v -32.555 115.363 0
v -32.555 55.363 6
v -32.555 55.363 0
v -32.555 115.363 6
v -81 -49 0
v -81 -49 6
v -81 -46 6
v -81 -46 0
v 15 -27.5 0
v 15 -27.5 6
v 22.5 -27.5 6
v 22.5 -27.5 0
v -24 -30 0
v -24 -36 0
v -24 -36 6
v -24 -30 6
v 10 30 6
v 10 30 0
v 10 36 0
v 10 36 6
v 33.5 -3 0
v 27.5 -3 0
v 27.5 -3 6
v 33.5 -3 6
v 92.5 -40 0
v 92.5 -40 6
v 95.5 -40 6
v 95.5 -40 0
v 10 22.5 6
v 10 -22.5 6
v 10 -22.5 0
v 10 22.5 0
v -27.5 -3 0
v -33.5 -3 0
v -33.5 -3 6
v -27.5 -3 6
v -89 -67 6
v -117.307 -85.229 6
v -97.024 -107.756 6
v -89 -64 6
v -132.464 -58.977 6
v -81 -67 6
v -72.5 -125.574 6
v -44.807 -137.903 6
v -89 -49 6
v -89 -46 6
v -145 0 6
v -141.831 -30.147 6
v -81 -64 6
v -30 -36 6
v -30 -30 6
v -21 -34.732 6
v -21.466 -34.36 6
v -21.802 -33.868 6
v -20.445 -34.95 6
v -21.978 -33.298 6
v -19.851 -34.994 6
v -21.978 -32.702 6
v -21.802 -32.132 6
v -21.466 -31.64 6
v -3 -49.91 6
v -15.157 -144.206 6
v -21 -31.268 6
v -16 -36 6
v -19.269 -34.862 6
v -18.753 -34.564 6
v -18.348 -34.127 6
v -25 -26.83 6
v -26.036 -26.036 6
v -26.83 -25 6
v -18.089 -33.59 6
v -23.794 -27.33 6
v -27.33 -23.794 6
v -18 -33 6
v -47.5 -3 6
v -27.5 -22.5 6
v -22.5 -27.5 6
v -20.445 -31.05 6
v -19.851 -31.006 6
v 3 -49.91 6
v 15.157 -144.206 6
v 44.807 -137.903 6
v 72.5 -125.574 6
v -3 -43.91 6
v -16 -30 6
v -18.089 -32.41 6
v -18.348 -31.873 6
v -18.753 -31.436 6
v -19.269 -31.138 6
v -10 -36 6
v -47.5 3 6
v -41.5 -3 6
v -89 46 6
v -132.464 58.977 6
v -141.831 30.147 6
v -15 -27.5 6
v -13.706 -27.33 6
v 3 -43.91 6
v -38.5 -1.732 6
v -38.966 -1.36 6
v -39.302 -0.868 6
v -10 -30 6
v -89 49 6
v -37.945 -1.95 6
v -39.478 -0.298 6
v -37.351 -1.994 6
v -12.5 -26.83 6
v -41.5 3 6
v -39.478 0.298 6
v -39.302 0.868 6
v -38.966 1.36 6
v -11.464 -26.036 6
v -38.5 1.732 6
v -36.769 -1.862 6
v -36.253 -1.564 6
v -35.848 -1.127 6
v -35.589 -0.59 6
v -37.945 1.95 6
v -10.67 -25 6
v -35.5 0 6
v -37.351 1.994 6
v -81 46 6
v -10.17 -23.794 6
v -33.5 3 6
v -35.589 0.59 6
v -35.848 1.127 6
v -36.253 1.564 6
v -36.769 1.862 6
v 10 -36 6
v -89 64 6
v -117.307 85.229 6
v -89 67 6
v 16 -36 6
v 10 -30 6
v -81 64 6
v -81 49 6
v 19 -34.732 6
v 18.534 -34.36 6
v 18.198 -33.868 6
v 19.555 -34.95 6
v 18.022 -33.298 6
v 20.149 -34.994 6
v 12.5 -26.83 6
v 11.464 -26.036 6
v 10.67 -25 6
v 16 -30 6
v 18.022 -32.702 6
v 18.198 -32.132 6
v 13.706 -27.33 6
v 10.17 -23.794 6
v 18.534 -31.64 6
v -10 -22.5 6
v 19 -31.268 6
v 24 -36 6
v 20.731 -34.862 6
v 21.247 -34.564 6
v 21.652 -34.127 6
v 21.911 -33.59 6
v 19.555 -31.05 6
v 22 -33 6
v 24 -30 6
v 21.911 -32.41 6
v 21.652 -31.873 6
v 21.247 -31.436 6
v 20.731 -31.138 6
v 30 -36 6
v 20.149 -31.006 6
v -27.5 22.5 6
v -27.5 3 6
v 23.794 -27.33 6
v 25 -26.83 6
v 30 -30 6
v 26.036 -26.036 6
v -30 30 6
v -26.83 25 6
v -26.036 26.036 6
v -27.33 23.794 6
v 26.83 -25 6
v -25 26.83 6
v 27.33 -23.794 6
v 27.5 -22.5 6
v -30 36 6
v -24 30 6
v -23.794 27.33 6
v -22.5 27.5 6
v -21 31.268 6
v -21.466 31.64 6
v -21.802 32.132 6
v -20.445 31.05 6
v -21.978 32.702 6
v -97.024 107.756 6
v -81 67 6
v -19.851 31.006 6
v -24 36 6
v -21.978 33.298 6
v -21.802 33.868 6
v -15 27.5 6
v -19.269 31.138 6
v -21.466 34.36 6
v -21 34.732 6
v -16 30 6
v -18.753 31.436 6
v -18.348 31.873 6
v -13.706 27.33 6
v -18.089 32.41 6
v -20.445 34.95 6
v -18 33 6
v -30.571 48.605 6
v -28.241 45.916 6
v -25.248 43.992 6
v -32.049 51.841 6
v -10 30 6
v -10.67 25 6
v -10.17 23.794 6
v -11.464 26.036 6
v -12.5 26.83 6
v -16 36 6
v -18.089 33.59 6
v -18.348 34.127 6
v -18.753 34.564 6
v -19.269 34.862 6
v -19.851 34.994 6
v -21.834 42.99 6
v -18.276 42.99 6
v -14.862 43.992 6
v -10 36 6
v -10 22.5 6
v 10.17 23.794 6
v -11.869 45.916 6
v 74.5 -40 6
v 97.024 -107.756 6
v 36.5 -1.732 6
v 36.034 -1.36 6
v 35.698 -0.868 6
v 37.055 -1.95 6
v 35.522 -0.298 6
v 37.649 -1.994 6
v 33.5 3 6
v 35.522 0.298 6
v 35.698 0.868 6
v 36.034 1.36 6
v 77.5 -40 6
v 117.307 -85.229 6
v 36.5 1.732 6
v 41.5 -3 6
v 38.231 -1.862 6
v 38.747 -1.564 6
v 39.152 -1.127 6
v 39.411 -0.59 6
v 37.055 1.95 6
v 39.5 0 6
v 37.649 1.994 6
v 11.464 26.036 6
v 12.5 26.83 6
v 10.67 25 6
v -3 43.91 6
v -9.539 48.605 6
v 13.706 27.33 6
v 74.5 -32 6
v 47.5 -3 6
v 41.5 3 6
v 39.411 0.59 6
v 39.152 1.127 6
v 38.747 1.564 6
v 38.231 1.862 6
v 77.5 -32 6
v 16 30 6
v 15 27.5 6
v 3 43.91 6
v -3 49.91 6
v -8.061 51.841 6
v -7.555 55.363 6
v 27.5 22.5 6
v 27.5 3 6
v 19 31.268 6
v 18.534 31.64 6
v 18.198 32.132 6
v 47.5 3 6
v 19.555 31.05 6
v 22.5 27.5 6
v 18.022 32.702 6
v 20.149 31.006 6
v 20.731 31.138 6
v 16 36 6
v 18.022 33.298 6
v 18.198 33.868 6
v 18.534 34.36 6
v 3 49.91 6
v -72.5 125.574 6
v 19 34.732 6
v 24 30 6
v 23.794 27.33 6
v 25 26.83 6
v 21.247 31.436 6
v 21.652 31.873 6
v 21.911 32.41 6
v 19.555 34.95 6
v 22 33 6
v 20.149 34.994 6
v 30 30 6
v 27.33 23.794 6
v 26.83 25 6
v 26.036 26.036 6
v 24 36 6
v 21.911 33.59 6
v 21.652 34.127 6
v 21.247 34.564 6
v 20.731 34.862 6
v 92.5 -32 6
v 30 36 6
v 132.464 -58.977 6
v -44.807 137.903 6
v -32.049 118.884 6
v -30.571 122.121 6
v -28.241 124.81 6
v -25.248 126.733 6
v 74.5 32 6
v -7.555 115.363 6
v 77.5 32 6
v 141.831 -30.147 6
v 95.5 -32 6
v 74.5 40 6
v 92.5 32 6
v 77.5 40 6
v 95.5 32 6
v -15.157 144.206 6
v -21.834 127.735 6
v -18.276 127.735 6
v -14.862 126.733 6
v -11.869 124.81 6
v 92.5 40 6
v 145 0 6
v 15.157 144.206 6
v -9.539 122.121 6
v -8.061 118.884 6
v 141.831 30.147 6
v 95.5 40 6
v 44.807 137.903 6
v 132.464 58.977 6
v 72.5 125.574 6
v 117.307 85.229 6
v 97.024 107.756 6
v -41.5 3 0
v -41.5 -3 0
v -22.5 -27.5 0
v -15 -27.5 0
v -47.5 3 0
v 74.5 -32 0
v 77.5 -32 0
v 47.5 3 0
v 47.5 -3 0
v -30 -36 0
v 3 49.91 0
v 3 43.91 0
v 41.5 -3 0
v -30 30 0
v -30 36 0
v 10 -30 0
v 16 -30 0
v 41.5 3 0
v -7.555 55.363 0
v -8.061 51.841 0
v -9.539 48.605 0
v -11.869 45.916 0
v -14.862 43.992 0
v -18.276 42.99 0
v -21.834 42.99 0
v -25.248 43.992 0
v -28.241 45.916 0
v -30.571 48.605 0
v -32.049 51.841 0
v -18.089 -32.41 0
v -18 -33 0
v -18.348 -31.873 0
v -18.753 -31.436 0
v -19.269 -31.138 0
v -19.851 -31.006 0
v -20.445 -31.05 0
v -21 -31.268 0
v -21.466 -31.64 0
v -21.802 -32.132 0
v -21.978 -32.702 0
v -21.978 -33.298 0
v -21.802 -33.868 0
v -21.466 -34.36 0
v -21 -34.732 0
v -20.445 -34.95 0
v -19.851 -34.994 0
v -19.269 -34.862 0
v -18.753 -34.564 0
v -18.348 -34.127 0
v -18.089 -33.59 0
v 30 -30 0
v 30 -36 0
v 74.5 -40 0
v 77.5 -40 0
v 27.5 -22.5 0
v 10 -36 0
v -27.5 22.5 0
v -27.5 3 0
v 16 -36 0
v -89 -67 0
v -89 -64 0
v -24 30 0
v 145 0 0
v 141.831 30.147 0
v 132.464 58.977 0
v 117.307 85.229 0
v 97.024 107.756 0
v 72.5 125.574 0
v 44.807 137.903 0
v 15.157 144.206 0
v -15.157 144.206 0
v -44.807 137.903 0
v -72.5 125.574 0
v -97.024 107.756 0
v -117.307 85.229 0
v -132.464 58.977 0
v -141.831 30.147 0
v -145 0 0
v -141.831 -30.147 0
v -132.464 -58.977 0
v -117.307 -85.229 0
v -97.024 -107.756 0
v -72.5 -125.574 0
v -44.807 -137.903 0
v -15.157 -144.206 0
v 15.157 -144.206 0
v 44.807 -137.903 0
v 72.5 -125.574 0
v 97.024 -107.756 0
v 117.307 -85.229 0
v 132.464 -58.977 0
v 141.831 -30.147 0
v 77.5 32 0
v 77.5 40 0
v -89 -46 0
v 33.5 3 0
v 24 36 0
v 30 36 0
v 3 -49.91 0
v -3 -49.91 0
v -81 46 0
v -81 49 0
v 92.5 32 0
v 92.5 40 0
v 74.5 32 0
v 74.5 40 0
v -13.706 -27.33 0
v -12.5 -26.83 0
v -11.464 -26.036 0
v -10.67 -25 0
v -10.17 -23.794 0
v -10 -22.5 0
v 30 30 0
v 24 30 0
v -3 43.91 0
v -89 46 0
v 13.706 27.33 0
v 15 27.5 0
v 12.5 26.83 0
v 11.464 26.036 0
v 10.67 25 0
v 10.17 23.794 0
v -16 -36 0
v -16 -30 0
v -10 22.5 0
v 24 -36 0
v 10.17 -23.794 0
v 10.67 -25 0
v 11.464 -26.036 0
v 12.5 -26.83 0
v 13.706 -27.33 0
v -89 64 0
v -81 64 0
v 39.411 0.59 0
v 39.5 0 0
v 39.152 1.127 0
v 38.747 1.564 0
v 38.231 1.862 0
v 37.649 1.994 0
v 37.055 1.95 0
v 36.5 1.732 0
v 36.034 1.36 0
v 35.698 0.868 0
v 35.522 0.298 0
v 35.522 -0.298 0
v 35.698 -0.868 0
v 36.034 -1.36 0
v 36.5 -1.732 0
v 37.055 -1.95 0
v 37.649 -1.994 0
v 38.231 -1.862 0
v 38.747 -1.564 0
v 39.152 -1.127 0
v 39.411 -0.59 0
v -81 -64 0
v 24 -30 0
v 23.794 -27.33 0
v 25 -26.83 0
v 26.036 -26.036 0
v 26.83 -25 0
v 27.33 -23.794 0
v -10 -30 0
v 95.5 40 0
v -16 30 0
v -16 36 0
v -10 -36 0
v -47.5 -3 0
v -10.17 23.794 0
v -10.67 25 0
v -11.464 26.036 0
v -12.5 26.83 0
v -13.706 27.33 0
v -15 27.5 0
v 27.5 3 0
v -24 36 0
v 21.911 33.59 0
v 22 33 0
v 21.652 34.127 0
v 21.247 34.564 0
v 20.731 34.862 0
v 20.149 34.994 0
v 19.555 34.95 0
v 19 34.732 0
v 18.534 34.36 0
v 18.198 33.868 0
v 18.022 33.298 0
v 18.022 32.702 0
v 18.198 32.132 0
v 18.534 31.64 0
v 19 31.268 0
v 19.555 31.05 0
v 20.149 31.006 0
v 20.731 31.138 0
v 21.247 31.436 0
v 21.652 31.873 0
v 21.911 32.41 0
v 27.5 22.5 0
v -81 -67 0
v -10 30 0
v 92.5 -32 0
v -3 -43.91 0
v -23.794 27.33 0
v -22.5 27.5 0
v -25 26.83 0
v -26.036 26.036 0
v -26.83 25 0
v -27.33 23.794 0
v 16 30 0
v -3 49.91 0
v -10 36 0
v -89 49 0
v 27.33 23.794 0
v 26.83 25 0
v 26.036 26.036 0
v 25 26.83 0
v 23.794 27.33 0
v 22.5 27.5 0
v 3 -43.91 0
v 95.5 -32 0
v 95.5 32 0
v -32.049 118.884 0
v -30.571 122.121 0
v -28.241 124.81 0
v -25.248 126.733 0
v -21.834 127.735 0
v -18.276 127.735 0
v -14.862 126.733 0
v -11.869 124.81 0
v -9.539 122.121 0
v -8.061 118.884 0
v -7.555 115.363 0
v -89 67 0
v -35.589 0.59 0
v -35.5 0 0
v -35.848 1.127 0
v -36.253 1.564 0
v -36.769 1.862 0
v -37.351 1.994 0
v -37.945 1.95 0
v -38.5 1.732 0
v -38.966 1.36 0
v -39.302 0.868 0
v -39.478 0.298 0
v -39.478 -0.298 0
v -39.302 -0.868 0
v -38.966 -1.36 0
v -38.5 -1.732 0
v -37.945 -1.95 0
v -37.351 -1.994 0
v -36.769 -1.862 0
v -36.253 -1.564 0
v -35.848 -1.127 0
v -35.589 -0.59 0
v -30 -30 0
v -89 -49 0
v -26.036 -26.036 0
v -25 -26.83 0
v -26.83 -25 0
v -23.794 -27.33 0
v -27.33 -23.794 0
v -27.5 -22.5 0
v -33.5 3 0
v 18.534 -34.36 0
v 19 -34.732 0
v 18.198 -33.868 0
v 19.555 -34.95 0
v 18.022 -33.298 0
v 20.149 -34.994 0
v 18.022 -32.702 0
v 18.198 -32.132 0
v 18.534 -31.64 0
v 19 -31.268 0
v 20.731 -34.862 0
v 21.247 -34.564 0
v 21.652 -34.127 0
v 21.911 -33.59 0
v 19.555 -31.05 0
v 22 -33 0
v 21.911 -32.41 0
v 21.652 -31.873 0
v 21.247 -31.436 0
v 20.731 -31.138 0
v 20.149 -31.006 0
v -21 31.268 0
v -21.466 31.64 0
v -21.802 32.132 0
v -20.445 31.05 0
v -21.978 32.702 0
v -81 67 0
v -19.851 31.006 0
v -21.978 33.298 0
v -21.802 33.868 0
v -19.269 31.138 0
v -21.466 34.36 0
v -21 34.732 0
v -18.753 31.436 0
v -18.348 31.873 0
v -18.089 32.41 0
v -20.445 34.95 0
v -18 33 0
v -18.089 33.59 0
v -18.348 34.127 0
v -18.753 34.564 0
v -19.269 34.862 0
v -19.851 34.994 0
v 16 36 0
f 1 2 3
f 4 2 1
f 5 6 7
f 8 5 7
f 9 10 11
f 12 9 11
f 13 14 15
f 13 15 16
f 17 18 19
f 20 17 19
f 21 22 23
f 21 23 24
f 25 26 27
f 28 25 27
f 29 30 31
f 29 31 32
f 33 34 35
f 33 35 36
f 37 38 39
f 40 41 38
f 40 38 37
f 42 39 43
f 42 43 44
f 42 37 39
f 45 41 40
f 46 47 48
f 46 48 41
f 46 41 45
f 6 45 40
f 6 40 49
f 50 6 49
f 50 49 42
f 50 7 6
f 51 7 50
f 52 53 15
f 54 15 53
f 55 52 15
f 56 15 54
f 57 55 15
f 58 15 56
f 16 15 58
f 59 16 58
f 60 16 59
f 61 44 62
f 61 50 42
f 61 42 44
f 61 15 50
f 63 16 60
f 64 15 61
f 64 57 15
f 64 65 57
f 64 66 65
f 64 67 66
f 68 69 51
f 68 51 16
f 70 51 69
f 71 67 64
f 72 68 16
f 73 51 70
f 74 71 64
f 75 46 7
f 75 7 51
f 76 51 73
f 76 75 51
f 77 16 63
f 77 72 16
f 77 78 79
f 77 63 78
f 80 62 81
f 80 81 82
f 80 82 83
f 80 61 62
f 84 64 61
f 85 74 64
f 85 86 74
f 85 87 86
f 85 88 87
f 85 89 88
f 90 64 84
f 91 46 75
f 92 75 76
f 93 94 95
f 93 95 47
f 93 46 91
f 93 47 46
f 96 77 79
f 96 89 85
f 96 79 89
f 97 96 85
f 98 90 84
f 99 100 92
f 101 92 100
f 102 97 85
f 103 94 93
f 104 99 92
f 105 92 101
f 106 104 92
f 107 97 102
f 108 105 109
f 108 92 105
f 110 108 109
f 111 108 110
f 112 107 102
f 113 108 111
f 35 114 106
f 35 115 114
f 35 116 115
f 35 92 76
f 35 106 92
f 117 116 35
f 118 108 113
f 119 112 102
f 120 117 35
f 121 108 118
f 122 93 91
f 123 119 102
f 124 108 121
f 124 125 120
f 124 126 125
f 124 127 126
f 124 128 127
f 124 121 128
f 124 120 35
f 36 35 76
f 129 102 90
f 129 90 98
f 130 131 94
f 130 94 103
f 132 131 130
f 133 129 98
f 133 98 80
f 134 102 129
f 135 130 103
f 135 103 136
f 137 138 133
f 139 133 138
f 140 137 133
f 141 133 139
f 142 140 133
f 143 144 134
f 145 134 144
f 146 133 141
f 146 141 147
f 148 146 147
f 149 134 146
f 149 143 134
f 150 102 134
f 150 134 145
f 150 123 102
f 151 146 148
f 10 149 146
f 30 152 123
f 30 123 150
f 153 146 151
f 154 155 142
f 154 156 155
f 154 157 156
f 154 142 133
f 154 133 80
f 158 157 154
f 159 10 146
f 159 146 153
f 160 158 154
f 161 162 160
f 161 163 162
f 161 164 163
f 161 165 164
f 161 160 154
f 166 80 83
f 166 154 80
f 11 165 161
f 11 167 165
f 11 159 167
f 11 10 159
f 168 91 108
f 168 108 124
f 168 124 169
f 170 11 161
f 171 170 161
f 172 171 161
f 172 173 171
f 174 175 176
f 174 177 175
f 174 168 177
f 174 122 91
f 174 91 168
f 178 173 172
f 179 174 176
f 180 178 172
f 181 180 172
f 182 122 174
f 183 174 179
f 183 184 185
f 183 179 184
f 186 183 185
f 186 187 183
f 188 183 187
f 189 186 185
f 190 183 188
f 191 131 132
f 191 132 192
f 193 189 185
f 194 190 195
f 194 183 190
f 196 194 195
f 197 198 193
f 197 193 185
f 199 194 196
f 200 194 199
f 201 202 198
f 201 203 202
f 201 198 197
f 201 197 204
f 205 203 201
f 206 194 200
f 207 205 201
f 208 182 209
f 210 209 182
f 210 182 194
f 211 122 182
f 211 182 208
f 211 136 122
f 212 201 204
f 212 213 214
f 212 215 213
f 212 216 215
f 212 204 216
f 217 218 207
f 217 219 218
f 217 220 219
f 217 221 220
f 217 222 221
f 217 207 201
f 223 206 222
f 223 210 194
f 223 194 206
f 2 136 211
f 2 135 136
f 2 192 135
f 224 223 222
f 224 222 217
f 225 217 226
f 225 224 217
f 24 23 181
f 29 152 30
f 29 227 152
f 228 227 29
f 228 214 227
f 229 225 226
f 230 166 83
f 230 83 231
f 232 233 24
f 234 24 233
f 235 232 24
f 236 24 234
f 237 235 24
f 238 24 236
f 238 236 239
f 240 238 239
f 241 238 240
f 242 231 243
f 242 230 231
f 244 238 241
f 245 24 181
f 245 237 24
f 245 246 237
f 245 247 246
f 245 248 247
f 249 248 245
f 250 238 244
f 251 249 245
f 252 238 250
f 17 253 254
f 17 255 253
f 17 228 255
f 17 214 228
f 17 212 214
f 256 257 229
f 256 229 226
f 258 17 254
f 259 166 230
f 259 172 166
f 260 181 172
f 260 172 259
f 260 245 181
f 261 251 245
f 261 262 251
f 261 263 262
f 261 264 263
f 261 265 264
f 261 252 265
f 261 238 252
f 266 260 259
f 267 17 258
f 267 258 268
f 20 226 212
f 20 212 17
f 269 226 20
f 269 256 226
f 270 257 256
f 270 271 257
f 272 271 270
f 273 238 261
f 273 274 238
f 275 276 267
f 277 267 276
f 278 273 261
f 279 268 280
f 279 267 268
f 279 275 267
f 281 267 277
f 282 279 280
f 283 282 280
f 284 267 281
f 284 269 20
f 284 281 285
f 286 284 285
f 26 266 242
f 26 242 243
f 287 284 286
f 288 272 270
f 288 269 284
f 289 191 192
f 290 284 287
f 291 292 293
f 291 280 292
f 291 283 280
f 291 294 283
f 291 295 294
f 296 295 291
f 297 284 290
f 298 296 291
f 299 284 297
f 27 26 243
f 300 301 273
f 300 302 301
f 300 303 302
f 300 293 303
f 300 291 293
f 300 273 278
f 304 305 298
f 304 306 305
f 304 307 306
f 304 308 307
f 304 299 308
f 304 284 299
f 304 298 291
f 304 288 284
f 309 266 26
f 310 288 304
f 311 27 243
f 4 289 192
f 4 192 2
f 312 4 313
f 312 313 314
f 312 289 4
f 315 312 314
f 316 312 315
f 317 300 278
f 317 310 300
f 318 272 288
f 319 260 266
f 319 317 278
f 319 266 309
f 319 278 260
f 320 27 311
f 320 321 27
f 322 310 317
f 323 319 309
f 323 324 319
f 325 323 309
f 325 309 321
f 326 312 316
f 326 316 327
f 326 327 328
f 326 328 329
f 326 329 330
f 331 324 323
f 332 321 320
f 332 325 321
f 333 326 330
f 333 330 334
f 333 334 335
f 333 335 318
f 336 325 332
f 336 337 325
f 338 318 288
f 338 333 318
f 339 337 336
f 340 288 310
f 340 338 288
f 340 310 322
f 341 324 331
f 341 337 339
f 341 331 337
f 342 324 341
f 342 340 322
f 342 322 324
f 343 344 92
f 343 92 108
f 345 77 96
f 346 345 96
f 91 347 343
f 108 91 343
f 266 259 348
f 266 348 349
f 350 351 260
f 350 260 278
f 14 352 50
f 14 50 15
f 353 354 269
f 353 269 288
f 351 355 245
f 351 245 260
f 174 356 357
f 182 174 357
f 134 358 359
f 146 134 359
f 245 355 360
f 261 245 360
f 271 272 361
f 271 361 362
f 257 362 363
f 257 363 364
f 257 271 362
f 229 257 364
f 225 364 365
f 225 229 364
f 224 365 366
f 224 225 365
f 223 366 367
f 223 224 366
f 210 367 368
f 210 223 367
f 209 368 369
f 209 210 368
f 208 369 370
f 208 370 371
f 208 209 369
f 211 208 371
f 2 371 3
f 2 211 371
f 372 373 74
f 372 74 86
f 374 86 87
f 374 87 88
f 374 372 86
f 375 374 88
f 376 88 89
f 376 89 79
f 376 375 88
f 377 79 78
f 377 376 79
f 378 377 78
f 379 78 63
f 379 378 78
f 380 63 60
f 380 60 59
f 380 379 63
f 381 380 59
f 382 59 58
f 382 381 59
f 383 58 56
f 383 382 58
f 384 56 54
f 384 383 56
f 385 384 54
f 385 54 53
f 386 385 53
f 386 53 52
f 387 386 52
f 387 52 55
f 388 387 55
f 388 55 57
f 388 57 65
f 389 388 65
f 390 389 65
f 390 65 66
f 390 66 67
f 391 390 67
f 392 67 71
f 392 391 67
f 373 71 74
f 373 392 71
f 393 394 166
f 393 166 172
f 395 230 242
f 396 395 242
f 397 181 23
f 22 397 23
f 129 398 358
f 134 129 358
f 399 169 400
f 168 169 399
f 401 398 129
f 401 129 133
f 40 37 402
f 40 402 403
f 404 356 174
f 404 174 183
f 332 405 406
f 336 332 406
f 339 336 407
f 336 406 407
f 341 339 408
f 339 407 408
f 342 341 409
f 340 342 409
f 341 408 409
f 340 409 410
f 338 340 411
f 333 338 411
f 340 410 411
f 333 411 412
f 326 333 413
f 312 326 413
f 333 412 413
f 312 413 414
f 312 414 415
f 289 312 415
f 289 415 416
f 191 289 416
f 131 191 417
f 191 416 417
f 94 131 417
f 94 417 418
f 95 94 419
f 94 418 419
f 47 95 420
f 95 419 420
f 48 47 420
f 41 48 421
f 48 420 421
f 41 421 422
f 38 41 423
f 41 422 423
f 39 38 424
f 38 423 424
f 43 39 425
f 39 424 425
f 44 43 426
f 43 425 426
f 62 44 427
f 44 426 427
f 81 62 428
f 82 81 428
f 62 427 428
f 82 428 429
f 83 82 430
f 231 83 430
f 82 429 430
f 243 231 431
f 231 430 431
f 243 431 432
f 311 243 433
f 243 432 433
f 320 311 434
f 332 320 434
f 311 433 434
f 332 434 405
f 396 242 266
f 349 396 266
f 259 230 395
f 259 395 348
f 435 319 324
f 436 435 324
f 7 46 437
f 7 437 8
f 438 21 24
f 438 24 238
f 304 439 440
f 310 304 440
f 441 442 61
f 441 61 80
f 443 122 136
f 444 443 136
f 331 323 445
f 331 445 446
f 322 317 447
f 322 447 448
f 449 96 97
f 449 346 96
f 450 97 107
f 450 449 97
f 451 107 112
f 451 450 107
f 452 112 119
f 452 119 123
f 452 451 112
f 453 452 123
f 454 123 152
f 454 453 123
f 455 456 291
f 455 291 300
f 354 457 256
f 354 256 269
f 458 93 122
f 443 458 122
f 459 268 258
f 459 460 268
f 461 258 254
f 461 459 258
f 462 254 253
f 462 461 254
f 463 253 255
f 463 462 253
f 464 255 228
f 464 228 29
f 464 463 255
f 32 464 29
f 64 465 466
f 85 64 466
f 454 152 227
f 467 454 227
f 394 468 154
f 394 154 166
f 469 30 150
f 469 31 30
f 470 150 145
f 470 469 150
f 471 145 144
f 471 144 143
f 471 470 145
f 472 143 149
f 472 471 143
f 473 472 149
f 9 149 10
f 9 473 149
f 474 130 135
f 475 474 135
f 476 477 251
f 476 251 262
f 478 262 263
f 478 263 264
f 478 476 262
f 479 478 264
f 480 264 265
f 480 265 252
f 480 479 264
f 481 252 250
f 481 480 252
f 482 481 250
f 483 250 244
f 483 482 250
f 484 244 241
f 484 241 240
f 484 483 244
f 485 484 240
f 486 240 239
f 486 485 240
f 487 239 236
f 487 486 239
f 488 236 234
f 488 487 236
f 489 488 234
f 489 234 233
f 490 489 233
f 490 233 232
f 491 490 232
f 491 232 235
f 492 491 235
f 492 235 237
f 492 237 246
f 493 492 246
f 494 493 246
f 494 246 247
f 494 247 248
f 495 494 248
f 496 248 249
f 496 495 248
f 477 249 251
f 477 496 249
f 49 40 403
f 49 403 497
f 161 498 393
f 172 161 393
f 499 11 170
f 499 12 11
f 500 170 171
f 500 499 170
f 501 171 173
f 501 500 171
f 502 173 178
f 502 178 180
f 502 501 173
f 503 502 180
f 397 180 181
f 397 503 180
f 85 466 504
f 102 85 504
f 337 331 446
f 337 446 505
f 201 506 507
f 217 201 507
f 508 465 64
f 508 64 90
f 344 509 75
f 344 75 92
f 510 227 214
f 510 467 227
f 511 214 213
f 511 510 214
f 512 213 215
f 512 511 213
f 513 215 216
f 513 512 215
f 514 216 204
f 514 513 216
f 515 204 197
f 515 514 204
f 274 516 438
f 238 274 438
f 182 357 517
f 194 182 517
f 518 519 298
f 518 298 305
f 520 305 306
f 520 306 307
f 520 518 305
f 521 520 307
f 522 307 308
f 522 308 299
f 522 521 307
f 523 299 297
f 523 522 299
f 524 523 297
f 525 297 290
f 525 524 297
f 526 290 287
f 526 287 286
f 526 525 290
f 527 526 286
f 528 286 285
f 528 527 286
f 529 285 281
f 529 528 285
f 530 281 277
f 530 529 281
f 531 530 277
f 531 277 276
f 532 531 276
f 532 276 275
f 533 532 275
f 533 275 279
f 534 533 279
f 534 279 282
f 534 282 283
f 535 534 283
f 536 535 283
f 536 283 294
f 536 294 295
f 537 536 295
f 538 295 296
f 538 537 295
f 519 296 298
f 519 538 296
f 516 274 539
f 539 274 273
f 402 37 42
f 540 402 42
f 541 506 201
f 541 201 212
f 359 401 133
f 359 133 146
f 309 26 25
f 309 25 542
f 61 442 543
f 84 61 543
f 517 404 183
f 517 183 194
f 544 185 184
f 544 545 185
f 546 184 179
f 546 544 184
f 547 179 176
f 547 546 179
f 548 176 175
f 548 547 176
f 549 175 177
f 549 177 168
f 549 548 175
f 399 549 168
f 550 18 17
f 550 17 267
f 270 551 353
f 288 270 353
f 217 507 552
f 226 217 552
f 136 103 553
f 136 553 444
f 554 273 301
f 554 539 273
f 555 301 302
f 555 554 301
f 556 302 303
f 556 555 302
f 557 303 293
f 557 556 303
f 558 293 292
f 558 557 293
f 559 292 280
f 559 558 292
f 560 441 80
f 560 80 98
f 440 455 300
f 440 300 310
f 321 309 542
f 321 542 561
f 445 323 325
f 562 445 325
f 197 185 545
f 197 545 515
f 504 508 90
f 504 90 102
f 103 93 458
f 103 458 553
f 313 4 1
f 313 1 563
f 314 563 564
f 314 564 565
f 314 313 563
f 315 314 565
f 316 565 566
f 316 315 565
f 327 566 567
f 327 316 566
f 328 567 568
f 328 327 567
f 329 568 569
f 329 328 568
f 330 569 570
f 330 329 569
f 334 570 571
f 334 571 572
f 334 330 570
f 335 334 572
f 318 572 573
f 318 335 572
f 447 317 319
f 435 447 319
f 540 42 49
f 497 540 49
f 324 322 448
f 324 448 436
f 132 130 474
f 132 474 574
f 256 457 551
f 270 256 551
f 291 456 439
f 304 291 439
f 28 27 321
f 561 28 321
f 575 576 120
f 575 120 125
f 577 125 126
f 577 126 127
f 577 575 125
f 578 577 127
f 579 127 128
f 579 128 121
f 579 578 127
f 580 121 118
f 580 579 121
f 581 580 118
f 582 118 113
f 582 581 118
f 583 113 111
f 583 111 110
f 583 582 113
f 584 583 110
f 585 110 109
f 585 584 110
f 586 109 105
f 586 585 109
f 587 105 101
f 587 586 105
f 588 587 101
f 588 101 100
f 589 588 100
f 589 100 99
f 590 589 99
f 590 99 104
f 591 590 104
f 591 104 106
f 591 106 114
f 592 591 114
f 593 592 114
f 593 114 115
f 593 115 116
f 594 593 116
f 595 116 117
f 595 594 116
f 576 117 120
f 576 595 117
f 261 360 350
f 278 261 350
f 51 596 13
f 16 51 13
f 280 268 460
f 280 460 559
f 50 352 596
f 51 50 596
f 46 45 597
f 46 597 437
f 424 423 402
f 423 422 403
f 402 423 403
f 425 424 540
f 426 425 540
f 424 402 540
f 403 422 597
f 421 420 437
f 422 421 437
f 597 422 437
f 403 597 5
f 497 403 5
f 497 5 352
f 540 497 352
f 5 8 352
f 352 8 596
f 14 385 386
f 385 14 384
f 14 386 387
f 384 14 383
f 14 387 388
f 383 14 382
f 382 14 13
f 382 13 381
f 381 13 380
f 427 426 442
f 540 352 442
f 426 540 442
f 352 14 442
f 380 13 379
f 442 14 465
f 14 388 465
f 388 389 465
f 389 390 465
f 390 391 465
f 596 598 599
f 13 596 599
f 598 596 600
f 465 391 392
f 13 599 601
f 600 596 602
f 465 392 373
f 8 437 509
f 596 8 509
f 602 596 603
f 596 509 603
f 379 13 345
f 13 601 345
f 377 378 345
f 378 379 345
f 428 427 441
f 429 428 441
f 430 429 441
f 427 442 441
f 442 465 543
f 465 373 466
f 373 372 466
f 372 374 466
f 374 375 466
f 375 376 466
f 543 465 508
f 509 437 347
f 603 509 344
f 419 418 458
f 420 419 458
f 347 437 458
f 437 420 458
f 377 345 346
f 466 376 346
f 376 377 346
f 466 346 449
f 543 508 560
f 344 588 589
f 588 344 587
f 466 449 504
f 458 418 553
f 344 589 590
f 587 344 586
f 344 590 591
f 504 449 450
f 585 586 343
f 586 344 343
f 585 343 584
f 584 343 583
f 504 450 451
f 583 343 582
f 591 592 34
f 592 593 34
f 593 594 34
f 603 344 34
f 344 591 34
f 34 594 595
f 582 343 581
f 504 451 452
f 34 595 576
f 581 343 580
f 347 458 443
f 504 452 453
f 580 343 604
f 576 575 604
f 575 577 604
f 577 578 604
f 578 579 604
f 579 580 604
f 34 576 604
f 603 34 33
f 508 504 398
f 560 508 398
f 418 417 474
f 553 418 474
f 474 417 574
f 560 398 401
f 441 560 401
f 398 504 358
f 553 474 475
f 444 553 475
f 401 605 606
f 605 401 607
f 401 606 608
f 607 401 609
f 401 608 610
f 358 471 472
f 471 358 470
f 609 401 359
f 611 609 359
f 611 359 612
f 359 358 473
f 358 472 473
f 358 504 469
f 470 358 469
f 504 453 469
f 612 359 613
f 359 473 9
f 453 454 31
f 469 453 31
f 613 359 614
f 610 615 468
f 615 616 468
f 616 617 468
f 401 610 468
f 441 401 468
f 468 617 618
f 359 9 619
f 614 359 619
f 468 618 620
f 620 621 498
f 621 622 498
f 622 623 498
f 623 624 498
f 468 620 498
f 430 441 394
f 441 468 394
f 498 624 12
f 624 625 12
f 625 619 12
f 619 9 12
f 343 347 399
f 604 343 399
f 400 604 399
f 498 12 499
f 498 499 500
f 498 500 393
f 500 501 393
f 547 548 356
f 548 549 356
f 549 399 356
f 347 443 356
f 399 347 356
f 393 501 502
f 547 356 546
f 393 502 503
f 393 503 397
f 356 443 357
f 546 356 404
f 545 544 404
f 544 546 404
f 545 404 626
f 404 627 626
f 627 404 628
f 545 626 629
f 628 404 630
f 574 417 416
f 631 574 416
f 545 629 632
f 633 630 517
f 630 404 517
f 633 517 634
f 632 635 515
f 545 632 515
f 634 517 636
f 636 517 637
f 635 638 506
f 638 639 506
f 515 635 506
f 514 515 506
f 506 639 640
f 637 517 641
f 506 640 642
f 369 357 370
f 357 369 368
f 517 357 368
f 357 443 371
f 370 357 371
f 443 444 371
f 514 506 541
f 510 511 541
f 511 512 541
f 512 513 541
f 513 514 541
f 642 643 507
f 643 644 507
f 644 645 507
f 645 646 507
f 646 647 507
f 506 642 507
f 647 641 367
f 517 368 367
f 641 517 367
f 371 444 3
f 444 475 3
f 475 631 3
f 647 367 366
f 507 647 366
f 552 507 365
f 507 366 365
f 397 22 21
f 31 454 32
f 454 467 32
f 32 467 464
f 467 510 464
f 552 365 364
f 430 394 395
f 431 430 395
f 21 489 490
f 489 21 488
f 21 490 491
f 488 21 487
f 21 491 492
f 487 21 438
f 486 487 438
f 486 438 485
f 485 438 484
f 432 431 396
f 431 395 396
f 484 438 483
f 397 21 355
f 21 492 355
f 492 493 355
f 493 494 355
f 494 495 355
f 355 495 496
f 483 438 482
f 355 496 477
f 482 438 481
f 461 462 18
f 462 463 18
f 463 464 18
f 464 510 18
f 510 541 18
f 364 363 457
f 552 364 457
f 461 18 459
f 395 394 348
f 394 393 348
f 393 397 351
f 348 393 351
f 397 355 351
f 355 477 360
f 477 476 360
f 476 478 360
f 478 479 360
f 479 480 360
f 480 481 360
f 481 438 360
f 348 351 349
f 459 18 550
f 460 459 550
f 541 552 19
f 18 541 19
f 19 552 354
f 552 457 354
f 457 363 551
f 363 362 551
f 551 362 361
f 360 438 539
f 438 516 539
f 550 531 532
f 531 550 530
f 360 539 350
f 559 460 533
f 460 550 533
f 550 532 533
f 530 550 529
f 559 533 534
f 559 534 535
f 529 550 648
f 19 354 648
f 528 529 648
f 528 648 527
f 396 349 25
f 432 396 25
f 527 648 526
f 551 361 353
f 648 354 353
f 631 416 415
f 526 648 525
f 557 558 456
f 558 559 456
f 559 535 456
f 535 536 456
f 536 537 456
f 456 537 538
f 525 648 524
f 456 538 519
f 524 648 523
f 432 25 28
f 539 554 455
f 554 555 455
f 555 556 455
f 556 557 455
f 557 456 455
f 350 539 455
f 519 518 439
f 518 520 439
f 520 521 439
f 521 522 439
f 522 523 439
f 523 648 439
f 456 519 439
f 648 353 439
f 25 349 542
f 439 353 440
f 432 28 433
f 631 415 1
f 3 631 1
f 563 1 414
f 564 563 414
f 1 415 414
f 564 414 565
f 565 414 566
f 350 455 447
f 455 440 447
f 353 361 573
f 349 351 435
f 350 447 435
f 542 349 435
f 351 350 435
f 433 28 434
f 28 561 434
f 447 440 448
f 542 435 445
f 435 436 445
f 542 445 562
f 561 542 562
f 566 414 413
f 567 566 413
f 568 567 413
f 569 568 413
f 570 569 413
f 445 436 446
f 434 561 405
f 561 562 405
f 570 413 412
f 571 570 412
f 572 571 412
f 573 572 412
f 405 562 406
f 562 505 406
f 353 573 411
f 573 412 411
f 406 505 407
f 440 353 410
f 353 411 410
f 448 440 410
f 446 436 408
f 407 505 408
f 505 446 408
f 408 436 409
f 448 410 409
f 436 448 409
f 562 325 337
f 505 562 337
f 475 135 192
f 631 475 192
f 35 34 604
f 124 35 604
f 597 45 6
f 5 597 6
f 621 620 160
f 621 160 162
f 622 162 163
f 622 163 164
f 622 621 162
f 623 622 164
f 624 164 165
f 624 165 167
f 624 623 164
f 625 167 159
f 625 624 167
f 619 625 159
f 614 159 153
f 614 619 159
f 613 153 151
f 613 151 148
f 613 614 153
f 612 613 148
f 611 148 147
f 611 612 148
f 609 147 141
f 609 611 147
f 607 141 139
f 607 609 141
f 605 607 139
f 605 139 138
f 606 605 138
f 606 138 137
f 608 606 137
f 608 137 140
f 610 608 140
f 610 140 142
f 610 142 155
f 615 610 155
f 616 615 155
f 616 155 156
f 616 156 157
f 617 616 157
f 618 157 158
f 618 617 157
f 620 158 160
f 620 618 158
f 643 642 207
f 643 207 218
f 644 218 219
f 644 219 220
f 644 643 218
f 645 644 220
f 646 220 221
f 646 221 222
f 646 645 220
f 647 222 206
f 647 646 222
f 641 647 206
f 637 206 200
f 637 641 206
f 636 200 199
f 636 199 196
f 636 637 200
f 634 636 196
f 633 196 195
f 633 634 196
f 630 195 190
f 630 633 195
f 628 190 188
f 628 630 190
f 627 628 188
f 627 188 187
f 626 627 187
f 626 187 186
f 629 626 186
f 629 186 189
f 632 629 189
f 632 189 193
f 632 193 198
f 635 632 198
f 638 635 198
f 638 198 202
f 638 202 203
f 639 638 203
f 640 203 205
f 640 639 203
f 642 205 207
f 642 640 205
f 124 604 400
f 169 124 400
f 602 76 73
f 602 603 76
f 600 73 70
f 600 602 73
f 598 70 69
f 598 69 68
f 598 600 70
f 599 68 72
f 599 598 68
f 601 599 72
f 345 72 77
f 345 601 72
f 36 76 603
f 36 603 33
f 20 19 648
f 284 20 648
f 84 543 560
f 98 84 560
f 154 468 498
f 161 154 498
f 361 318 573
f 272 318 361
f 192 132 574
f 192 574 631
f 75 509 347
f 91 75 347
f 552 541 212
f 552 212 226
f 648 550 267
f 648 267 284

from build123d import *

# Parameters (mm, degrees)
ESQUISSE1_R             = 145
ESQUISSE1_R_2           = 2
ESQUISSE1_W             = 6
ESQUISSE1_H             = 6
BOSS_EXTRU_1_DEPTH      = 6
ESQUISSE2_W             = 17.5
ESQUISSE2_H             = 55
ESQUISSE2_W_2           = 3
ESQUISSE2_H_2           = 8
ESQUISSE2_W_3           = 8
ESQUISSE2_H_3           = 3
ENL_V_MAT_EXTRU_1_DEPTH = 6
CONG_1_R                = 5


with BuildPart() as part:
    # Esquisse1 → Boss.-Extru.1 (new body)
    with BuildSketch(Plane.XY):
        Circle(ESQUISSE1_R)
        with Locations((-37.5, 0)):
            Circle(ESQUISSE1_R_2, mode=Mode.SUBTRACT)
        with Locations((-20, -33)):
            Circle(ESQUISSE1_R_2, mode=Mode.SUBTRACT)
        with Locations((20, -33)):
            Circle(ESQUISSE1_R_2, mode=Mode.SUBTRACT)
        with Locations((20, 33)):
            Circle(ESQUISSE1_R_2, mode=Mode.SUBTRACT)
        with Locations((-20, 33)):
            Circle(ESQUISSE1_R_2, mode=Mode.SUBTRACT)
        with Locations((37.5, 0)):
            Circle(ESQUISSE1_R_2, mode=Mode.SUBTRACT)
        with Locations((0, -46.909918854)):
            Rectangle(ESQUISSE1_W, ESQUISSE1_H, mode=Mode.SUBTRACT)
        with Locations((0, 46.909918854)):
            Rectangle(ESQUISSE1_W, ESQUISSE1_H, mode=Mode.SUBTRACT)
        with Locations((-44.5, 0)):
            Rectangle(ESQUISSE1_W, ESQUISSE1_H, mode=Mode.SUBTRACT)
        with Locations((-30.5, 0)):
            Rectangle(ESQUISSE1_W, ESQUISSE1_H, mode=Mode.SUBTRACT)
        with Locations((-27, -33)):
            Rectangle(ESQUISSE1_W, ESQUISSE1_H, mode=Mode.SUBTRACT)
        with Locations((-13, -33)):
            Rectangle(ESQUISSE1_W, ESQUISSE1_H, mode=Mode.SUBTRACT)
        with Locations((13, -33)):
            Rectangle(ESQUISSE1_W, ESQUISSE1_H, mode=Mode.SUBTRACT)
        with Locations((27, -33)):
            Rectangle(ESQUISSE1_W, ESQUISSE1_H, mode=Mode.SUBTRACT)
        with Locations((13, 33)):
            Rectangle(ESQUISSE1_W, ESQUISSE1_H, mode=Mode.SUBTRACT)
        with Locations((27, 33)):
            Rectangle(ESQUISSE1_W, ESQUISSE1_H, mode=Mode.SUBTRACT)
        with Locations((-27, 33)):
            Rectangle(ESQUISSE1_W, ESQUISSE1_H, mode=Mode.SUBTRACT)
        with Locations((-13, 33)):
            Rectangle(ESQUISSE1_W, ESQUISSE1_H, mode=Mode.SUBTRACT)
        with Locations((30.5, 0)):
            Rectangle(ESQUISSE1_W, ESQUISSE1_H, mode=Mode.SUBTRACT)
        with Locations((44.5, 0)):
            Rectangle(ESQUISSE1_W, ESQUISSE1_H, mode=Mode.SUBTRACT)
    extrude(amount=BOSS_EXTRU_1_DEPTH)

    # Esquisse2 → Enlèv. mat.-Extru.1 (cut)
    with BuildSketch(Plane.XY.offset(6)):
        with Locations((-18.75, 0)):
            Rectangle(ESQUISSE2_W, ESQUISSE2_H)
        with Locations((18.75, 0)):
            Rectangle(ESQUISSE2_W, ESQUISSE2_H)
        with Locations((76, 36)):
            Rectangle(ESQUISSE2_W_2, ESQUISSE2_H_2)
        with Locations((94, 36)):
            Rectangle(ESQUISSE2_W_2, ESQUISSE2_H_2)
        with Locations((76, -36)):
            Rectangle(ESQUISSE2_W_2, ESQUISSE2_H_2)
        with Locations((94, -36)):
            Rectangle(ESQUISSE2_W_2, ESQUISSE2_H_2)
        with Locations((-85, -47.5)):
            Rectangle(ESQUISSE2_W_3, ESQUISSE2_H_3)
        with Locations((-85, 65.5)):
            Rectangle(ESQUISSE2_W_3, ESQUISSE2_H_3)
        with Locations((-85, 47.5)):
            Rectangle(ESQUISSE2_W_3, ESQUISSE2_H_3)
        with Locations((-85, -65.5)):
            Rectangle(ESQUISSE2_W_3, ESQUISSE2_H_3)
        with BuildLine():
            Line((-32.555083478, 55.362694963), (-32.555083478, 115.362694963))
            ThreePointArc((-32.555083478, 115.362694963), (-20.055083478, 127.862694963), (-7.555083478, 115.362694963))
            Line((-7.555083478, 115.362694963), (-7.555083478, 55.362694963))
            ThreePointArc((-7.555083478, 55.362694963), (-20.055083478, 42.862694963), (-32.555083478, 55.362694963))
        make_face()
    extrude(amount=-ENL_V_MAT_EXTRU_1_DEPTH, mode=Mode.SUBTRACT)

    # Congé1
    cong_1_edges = [part.edges().sort_by_distance(p)[0] for p in [
        (27.5, 27.5, 3),
        (10, 27.5, 3),
        (27.5, -27.5, 3),
        (10, -27.5, 3),
        (-27.5, -27.5, 3),
        (-27.5, 27.5, 3),
        (-10, 27.5, 3),
        (-10, -27.5, 3),
    ]]
    fillet(cong_1_edges, radius=CONG_1_R)


solid = part.part
